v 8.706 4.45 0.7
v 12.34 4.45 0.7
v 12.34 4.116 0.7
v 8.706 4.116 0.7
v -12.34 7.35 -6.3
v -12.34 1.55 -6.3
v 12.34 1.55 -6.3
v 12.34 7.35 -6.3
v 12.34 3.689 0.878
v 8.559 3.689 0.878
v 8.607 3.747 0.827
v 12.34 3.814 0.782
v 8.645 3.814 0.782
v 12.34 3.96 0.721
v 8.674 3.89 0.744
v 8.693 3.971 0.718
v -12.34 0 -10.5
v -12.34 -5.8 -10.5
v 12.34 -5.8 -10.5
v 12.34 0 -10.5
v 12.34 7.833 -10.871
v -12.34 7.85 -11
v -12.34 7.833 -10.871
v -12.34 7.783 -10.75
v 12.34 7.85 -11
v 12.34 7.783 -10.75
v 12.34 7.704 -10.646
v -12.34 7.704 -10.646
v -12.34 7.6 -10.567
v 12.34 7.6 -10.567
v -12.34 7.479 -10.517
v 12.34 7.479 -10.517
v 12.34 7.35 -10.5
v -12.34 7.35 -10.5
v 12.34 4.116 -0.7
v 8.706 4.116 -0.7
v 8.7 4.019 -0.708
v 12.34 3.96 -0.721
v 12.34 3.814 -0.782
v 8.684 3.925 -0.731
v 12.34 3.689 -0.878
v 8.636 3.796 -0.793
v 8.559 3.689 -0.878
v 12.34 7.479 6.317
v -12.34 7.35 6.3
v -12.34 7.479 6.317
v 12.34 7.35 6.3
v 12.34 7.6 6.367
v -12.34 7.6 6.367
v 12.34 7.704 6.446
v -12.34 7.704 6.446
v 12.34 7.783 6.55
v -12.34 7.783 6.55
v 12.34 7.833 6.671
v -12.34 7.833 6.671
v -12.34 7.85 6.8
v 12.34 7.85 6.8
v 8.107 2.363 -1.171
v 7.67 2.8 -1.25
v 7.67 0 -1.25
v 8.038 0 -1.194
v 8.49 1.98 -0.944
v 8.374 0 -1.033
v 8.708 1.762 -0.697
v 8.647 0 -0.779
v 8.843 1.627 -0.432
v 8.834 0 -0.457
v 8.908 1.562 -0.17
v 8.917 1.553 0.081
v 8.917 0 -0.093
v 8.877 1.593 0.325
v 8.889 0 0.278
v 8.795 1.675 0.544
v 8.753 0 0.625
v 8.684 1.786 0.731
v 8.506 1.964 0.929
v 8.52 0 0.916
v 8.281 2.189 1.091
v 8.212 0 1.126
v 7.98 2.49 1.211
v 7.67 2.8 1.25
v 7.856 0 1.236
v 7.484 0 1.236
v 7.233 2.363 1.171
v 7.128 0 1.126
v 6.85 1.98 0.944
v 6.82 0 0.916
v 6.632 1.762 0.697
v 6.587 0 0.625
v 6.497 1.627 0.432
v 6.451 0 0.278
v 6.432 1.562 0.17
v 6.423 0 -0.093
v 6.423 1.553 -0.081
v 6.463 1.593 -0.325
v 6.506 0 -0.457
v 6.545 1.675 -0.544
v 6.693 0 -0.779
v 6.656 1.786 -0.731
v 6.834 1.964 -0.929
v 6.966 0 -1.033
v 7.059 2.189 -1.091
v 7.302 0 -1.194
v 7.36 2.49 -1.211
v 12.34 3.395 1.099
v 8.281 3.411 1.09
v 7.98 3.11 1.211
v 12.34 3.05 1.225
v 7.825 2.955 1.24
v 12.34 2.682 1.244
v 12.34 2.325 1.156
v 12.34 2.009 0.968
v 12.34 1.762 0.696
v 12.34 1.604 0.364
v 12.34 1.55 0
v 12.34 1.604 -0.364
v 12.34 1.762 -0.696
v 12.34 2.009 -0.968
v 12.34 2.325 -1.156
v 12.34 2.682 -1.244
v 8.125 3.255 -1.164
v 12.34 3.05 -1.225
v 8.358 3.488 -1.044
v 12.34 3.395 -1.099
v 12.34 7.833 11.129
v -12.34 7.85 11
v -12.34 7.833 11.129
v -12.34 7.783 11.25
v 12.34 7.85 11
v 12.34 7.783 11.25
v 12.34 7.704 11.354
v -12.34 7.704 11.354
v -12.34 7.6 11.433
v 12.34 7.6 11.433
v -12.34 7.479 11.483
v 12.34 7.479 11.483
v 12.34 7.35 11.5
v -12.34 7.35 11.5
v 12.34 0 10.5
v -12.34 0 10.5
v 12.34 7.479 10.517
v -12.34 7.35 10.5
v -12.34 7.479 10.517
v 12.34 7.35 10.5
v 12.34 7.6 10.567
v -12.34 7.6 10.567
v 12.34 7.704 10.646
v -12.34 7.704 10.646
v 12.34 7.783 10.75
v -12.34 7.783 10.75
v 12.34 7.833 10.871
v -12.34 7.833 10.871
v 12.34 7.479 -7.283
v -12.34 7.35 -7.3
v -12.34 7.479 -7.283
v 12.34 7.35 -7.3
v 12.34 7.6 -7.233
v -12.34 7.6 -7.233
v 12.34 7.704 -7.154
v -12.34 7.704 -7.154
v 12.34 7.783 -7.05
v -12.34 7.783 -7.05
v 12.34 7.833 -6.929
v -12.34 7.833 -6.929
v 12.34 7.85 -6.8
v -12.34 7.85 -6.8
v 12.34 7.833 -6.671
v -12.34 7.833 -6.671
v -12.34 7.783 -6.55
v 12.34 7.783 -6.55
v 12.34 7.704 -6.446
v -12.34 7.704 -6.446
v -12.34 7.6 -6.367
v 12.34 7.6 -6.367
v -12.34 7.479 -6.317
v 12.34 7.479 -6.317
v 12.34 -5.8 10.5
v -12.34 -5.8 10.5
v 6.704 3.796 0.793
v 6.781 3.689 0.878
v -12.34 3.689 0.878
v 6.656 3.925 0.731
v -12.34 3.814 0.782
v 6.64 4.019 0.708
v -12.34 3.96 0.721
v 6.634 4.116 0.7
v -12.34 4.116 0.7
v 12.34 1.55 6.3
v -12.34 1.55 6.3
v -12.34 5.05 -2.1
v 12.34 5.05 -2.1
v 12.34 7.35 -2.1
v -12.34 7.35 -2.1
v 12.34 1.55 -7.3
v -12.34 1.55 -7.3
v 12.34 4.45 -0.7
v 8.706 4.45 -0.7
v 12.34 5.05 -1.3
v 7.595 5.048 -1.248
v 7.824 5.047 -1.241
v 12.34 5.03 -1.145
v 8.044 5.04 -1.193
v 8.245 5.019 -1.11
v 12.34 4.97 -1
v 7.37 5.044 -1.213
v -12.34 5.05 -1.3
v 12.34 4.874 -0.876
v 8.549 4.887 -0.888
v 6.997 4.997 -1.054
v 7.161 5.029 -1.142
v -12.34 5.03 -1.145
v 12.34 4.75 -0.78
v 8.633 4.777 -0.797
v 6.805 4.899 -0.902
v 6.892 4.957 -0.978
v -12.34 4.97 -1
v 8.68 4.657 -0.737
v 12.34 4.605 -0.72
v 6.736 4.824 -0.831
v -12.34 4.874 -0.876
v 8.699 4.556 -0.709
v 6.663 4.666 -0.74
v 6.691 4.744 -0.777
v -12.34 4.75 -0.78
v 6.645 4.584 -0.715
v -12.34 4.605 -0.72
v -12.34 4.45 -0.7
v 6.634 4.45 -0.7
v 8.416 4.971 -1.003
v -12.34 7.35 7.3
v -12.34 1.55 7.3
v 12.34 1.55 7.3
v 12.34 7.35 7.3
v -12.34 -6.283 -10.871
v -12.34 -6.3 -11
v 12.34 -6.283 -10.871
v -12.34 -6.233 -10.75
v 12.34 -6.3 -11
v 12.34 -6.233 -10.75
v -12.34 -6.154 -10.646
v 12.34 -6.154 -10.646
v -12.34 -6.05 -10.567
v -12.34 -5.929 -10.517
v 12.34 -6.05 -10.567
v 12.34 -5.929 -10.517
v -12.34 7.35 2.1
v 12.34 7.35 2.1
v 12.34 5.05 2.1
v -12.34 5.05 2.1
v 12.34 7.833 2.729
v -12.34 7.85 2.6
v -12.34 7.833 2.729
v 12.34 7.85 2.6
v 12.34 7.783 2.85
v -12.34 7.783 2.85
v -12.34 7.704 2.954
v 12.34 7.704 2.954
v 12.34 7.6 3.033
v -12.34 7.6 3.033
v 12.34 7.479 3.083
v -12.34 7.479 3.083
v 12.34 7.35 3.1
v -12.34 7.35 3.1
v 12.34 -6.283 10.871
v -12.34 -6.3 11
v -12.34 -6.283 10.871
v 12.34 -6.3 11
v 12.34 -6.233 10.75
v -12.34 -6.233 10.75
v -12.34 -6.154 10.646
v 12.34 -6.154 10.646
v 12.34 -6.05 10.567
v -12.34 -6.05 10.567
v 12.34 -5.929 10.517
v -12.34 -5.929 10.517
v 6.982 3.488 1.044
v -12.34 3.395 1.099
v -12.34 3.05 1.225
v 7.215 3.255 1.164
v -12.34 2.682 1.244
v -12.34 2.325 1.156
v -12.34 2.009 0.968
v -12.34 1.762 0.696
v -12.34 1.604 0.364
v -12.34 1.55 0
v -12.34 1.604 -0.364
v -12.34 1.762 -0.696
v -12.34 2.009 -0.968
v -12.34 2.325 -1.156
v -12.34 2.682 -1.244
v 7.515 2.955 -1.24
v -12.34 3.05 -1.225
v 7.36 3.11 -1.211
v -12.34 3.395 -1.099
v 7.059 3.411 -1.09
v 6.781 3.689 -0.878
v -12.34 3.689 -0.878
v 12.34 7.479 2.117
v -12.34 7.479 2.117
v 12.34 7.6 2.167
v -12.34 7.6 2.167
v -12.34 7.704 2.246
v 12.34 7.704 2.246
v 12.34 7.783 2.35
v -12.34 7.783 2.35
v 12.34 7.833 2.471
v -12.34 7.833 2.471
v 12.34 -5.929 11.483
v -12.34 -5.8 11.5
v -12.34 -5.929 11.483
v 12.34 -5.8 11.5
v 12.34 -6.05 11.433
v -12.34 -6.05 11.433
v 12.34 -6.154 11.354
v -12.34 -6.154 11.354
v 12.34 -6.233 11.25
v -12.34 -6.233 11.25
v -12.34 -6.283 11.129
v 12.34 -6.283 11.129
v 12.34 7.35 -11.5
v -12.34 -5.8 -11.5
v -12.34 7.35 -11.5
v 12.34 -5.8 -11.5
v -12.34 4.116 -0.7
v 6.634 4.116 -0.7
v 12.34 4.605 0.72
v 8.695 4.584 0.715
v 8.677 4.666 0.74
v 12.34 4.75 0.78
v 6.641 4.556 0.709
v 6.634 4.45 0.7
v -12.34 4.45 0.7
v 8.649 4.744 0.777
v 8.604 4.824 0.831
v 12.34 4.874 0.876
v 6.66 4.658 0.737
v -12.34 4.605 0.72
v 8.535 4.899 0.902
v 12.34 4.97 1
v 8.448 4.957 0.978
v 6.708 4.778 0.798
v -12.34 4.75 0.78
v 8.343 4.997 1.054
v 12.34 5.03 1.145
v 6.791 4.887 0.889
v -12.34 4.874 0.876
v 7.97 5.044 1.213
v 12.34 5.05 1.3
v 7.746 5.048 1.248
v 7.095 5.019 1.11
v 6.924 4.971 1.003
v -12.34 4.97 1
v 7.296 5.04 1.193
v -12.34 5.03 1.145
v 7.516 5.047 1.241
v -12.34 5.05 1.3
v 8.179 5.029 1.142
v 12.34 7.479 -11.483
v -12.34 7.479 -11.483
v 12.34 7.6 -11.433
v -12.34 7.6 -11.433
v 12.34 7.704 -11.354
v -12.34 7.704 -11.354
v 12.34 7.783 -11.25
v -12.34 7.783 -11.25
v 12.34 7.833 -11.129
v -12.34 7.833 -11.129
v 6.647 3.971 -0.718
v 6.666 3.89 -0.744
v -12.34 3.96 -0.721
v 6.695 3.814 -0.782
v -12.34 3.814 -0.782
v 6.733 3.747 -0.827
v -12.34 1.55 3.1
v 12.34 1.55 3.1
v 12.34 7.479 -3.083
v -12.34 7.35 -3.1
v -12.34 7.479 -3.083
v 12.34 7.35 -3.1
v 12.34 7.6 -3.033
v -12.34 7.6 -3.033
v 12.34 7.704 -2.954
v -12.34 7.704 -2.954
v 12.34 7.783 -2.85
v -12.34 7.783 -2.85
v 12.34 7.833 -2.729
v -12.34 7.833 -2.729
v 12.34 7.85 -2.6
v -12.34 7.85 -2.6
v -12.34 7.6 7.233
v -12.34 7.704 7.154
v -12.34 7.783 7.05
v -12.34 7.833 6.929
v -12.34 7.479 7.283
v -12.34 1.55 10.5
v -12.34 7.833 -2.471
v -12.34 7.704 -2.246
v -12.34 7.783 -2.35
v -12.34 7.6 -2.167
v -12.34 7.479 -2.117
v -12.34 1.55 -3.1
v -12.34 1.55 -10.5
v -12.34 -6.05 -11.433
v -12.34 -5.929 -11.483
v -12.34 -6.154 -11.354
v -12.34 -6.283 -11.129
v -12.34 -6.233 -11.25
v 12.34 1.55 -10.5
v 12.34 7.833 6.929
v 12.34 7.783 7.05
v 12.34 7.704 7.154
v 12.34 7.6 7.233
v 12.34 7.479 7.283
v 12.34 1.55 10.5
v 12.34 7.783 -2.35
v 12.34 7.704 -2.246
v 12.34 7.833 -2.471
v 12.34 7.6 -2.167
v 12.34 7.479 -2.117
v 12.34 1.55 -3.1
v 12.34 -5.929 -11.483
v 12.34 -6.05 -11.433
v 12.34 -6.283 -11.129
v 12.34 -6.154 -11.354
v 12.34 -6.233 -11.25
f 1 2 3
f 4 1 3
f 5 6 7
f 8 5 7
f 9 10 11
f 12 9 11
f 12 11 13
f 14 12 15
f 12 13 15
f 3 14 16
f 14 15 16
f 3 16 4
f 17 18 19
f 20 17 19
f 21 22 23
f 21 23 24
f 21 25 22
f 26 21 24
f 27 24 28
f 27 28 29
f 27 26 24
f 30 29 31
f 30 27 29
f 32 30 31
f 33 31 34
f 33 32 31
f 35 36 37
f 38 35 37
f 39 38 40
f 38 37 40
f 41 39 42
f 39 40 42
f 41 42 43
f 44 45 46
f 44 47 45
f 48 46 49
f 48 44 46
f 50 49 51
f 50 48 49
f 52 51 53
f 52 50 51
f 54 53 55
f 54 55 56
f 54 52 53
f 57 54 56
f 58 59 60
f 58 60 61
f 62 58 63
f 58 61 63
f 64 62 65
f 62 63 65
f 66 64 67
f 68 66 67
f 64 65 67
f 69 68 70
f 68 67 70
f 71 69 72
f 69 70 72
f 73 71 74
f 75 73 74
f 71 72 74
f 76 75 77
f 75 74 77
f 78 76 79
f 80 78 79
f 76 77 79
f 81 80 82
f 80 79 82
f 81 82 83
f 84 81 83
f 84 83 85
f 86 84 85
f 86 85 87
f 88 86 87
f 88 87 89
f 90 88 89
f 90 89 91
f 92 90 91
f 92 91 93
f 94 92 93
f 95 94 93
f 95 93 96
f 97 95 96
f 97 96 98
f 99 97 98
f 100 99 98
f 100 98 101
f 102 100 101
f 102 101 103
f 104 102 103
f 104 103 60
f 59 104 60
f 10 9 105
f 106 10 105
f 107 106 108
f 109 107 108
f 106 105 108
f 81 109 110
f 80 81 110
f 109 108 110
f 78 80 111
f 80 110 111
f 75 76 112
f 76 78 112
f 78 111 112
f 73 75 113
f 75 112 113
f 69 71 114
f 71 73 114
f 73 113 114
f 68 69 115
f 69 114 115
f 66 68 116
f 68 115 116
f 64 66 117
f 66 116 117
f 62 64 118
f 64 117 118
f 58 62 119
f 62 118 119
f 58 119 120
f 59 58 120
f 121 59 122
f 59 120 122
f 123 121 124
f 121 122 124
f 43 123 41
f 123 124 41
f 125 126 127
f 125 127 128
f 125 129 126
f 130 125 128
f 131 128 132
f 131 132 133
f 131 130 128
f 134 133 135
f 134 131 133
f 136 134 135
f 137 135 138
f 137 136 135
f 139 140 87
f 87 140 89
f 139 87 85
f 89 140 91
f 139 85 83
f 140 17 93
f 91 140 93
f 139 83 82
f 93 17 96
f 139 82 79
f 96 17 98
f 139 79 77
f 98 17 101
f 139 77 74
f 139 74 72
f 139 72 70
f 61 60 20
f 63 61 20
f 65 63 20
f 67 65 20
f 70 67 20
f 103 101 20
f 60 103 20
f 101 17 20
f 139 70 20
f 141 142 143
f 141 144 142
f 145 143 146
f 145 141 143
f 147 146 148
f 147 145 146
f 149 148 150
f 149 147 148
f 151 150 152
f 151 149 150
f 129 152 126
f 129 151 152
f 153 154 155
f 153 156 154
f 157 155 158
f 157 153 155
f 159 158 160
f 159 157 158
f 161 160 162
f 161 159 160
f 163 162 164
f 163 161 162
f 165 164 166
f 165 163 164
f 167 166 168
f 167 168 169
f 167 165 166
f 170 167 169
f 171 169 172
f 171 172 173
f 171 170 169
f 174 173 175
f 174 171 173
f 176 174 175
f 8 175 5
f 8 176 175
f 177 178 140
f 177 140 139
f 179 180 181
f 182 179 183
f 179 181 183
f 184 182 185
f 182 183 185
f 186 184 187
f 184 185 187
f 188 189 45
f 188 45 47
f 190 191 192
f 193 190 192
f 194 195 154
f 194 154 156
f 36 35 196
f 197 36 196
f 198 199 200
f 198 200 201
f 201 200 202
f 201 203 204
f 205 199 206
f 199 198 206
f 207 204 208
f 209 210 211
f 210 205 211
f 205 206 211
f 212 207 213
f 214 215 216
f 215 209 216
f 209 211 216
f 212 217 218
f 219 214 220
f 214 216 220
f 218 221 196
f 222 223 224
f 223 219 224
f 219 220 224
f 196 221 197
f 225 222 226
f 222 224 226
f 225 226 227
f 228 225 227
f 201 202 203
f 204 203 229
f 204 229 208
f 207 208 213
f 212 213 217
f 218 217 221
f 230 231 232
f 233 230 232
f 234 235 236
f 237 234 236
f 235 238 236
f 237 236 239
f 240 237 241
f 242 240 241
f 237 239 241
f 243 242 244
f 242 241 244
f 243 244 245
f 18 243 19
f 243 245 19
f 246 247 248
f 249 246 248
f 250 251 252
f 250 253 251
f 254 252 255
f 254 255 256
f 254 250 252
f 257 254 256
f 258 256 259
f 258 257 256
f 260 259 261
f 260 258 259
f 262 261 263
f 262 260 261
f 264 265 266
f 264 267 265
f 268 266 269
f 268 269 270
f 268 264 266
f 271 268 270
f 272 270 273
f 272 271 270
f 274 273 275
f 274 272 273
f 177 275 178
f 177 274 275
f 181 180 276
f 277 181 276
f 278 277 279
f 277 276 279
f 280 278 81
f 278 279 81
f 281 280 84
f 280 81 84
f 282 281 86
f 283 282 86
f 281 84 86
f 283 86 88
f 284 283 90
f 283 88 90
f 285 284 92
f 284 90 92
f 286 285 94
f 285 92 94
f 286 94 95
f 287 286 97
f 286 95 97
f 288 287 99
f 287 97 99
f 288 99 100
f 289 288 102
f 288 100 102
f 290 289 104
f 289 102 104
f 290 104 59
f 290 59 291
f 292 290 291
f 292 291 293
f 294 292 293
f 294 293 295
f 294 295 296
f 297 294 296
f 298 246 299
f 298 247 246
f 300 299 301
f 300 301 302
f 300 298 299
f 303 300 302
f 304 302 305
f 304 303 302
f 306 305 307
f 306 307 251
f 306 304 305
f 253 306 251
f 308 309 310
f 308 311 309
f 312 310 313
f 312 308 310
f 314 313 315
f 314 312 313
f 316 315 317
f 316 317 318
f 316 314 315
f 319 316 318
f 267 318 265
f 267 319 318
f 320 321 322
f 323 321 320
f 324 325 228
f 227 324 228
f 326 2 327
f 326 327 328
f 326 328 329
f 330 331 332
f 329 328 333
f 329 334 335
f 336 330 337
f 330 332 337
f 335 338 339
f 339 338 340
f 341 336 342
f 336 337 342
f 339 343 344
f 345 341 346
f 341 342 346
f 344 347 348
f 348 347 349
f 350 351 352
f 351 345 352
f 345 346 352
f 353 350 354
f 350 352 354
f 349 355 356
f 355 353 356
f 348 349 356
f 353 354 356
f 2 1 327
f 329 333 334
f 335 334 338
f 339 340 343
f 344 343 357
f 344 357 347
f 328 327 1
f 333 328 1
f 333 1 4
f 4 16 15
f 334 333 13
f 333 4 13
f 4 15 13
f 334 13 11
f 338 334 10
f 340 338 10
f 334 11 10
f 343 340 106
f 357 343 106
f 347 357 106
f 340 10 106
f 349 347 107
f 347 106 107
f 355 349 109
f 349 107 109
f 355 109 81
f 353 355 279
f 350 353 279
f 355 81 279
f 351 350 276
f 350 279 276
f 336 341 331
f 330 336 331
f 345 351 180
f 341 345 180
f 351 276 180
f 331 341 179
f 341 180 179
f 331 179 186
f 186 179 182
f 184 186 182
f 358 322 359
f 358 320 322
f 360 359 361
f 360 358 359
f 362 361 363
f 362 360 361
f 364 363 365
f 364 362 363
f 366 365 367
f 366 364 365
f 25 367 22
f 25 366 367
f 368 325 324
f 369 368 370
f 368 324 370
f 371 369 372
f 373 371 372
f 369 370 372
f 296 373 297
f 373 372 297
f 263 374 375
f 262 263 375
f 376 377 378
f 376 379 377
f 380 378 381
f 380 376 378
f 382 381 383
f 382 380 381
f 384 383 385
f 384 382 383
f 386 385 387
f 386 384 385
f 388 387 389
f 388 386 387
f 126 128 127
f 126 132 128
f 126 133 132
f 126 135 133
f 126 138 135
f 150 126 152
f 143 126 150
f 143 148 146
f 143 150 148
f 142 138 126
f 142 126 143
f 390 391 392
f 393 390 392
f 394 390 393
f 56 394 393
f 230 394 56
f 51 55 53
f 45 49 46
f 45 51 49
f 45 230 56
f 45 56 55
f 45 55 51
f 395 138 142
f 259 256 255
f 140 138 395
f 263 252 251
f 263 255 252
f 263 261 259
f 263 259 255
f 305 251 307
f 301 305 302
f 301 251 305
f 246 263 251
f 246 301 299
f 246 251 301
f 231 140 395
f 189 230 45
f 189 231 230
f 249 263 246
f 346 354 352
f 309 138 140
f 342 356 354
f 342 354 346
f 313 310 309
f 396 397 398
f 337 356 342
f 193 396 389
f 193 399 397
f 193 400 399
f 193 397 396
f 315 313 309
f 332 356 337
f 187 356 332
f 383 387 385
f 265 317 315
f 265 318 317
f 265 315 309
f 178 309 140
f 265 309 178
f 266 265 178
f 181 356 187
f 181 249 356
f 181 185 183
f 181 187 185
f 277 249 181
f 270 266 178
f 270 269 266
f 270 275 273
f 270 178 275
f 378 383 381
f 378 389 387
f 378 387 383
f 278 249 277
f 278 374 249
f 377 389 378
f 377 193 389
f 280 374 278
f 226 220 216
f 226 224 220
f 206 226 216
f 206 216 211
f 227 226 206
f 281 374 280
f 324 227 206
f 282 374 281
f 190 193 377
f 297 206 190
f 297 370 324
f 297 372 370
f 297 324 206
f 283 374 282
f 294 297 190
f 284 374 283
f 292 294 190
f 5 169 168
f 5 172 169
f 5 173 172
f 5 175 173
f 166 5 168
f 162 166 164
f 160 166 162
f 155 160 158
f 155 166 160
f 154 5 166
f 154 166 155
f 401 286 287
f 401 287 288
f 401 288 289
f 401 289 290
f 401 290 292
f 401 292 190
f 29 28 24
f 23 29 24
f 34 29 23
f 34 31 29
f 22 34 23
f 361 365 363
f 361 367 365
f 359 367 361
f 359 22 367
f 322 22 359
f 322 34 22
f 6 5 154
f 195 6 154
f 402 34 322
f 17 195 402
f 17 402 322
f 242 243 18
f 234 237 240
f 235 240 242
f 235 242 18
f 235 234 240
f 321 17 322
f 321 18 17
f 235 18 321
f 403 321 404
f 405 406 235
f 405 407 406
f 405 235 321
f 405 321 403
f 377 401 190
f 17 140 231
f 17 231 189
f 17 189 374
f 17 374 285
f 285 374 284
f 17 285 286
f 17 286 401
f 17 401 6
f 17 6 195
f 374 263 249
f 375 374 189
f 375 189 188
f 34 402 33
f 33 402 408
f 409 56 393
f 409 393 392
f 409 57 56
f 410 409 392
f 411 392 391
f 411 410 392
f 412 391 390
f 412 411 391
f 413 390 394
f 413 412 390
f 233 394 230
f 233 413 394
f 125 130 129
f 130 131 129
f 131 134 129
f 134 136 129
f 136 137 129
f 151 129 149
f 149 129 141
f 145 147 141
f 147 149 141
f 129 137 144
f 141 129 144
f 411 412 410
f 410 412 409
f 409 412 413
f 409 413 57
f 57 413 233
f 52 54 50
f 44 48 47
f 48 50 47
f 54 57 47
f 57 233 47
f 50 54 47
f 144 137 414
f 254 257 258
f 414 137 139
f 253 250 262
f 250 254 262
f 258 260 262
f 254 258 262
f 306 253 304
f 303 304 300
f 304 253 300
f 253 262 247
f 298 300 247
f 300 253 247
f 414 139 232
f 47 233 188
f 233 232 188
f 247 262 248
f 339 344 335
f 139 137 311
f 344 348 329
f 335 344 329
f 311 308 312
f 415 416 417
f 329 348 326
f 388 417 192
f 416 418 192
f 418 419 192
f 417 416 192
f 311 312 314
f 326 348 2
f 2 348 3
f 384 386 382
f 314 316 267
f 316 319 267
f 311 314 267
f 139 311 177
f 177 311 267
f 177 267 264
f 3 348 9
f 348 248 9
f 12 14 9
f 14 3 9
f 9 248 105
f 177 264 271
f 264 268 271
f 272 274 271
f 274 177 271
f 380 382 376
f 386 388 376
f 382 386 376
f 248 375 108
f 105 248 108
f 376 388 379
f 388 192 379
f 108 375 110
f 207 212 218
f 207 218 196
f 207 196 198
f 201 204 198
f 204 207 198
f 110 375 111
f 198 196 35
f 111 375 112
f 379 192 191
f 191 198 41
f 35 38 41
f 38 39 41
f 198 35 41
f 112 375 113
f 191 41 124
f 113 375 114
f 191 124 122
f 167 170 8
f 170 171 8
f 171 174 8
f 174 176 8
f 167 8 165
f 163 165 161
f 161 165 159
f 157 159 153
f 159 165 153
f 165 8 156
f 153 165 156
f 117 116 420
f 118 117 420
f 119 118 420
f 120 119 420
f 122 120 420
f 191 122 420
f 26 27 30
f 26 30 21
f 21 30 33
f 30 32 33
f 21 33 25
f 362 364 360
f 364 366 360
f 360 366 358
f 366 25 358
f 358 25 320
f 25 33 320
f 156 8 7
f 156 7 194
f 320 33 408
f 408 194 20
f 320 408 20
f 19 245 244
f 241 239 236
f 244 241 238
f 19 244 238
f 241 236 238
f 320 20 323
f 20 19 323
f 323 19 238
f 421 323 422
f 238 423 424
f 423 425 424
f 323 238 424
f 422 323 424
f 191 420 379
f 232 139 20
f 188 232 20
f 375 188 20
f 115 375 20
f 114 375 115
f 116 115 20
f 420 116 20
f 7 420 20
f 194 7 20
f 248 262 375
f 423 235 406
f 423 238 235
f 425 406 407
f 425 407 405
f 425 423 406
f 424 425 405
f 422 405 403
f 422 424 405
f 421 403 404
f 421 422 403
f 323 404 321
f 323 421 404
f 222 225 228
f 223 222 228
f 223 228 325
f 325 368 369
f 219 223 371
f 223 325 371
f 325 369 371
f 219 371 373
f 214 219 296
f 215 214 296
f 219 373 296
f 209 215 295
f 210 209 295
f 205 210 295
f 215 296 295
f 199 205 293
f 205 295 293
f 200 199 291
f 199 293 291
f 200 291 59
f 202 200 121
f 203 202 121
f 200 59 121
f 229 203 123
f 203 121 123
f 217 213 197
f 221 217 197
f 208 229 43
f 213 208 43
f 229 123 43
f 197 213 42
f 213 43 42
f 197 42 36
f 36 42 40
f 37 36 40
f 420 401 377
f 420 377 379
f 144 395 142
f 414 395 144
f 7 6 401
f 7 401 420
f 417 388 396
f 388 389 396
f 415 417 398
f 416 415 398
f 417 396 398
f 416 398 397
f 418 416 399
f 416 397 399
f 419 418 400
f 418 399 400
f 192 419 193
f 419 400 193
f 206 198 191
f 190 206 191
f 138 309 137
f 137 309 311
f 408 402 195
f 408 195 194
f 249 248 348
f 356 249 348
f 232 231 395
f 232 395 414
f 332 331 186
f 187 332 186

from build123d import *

# Parameters (mm, degrees)
SKETCH1_W                = 24.68
SKETCH1_H                = 23
BOSS_EXTRUDE1_DEPTH      = 1.55
BOSS_EXTRUDE2_DEPTH      = 6.3
BOSS_EXTRUDE2_DEPTH_BACK = 7.85
SKETCH2_W                = 24.68
SKETCH2_H                = 1
SKETCH3_W                = 24.68
SKETCH3_H                = 1
BOSS_EXTRUDE3_DEPTH      = 6.3
SKETCH4_W                = 24.68
SKETCH4_H                = 6.2
BOSS_EXTRUDE4_DEPTH      = 6.3
CUT_EXTRUDE1_DEPTH       = 29.336811747
FILLET1_R                = 0.5
FILLET2_R                = 0.6
SKETCH6_R                = 1.25
CUT_EXTRUDE2_DEPTH       = 10


with BuildPart() as part:
    # Sketch1 → Boss-Extrude1 (new body)
    with BuildSketch(Plane(origin=(0, 0, 0), x_dir=(1, 0, 0), z_dir=(0, 1, 0))):
        Rectangle(SKETCH1_W, SKETCH1_H)
    extrude(amount=BOSS_EXTRUDE1_DEPTH)

    # Sketch2 → Boss-Extrude2 (add, two sides: drawn at the far end of the back side and taken through both)
    with BuildSketch(Plane(origin=(0, 1.55, 0), x_dir=(1, 0, 0), z_dir=(0, 1, 0)).offset(-BOSS_EXTRUDE2_DEPTH_BACK)):
        with Locations((0, 11)):
            Rectangle(SKETCH2_W, SKETCH2_H)
        with Locations((0, -11)):
            Rectangle(SKETCH2_W, SKETCH2_H)
    extrude(amount=BOSS_EXTRUDE2_DEPTH + BOSS_EXTRUDE2_DEPTH_BACK)

    # Sketch3 → Boss-Extrude3 (add)
    with BuildSketch(Plane(origin=(0, 1.55, 0), x_dir=(1, 0, 0), z_dir=(0, 1, 0))):
        with Locations((0, 6.8)):
            Rectangle(SKETCH3_W, SKETCH3_H)
        with Locations((0, -6.8)):
            Rectangle(SKETCH3_W, SKETCH3_H)
    extrude(amount=BOSS_EXTRUDE3_DEPTH)

    # Sketch4 → Boss-Extrude4 (add)
    with BuildSketch(Plane(origin=(0, 1.55, 0), x_dir=(1, 0, 0), z_dir=(0, 1, 0))):
        Rectangle(SKETCH4_W, SKETCH4_H)
    extrude(amount=BOSS_EXTRUDE4_DEPTH)

    # Sketch5 → Cut-Extrude1 (cut, through all)
    with BuildSketch(Plane(origin=(12.34, 0, 0), x_dir=(0, 0, -1), z_dir=(1, 0, 0))):
        with BuildLine():
            Line((-2.1, 5.05), (-0.7, 5.05))
            Line((-0.7, 5.05), (-0.7, 3.835615759))
            ThreePointArc((-0.7, 3.835615759), (0, 1.55), (0.7, 3.835615759))
            Line((0.7, 3.835615759), (0.7, 5.05))
            Line((0.7, 5.05), (2.1, 5.05))
            Line((2.1, 5.05), (2.1, 8.15))
            Line((2.1, 8.15), (-2.1, 8.15))
            Line((-2.1, 8.15), (-2.1, 5.05))
        make_face()
    extrude(amount=-CUT_EXTRUDE1_DEPTH, mode=Mode.SUBTRACT)

    # Fillet1
    fillet1_edges = [part.edges().sort_by_distance(p)[0] for p in [
        (0, -6.3, -11.5),
        (0, -6.3, -10.5),
        (0, -6.3, 10.5),
        (0, -6.3, 11.5),
        (0, 7.85, -11.5),
        (0, 7.85, -10.5),
        (0, 7.85, -7.3),
        (0, 7.85, -6.3),
        (0, 7.85, -3.1),
        (0, 7.85, -2.1),
        (0, 7.85, 2.1),
        (0, 7.85, 3.1),
        (0, 7.85, 6.3),
        (0, 7.85, 7.3),
        (0, 7.85, 10.5),
        (0, 7.85, 11.5),
    ]]
    fillet(fillet1_edges, radius=FILLET1_R - 0.0001)  # a hair under: the kernel refuses the full size

    # Fillet2
    fillet2_edges = [part.edges().sort_by_distance(p)[0] for p in [
        (0, 3.835615759, -0.7),
        (0, 3.835615759, 0.7),
        (0, 5.05, 0.7),
        (0, 5.05, -0.7),
    ]]
    fillet(fillet2_edges, radius=FILLET2_R)

    # Sketch6 → Cut-Extrude2 (cut)
    with BuildSketch(Plane.XZ):
        with Locations(Location((7.67, 0, 0), (0, 0, 270))):
            Circle(SKETCH6_R)
    extrude(amount=-CUT_EXTRUDE2_DEPTH, mode=Mode.SUBTRACT)


solid = part.part
